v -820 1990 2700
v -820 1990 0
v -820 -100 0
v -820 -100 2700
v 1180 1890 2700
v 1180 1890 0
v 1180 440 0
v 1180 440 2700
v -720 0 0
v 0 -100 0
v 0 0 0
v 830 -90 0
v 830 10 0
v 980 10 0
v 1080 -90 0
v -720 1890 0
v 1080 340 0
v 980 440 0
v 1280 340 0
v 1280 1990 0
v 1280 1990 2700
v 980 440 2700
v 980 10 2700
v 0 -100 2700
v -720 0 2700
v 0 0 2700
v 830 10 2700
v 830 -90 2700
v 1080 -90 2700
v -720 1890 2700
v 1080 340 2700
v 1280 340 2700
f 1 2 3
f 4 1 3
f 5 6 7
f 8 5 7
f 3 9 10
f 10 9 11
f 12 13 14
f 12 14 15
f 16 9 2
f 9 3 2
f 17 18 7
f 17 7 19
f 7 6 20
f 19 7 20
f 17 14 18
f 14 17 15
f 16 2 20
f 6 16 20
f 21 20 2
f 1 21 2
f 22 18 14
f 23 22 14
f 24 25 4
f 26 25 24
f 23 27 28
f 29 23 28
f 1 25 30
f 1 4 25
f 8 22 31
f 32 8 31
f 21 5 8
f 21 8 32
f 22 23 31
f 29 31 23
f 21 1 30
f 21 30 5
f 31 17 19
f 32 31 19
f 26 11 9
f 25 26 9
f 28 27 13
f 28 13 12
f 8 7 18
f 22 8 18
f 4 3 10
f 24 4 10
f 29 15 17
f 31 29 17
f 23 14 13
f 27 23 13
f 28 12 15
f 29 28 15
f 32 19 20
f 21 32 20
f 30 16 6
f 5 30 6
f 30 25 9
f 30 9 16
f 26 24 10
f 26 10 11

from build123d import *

# Parameters (mm, degrees)
F1_DEPTH = 2700


with BuildPart() as f1:
    # F0 (on Top) → F1 (new body)
    with BuildSketch(Plane.XY):
        Polygon((0, -100), (0, 0), (-720, 0), (-720, 1890), (1180, 1890), (1180, 440), (980, 440), (980, 10), (830, 10), (830, -90), (1080, -90), (1080, 340), (1280, 340), (1280, 1990), (-820, 1990), (-820, -100), align=None)
    extrude(amount=F1_DEPTH)


solid = f1.part
